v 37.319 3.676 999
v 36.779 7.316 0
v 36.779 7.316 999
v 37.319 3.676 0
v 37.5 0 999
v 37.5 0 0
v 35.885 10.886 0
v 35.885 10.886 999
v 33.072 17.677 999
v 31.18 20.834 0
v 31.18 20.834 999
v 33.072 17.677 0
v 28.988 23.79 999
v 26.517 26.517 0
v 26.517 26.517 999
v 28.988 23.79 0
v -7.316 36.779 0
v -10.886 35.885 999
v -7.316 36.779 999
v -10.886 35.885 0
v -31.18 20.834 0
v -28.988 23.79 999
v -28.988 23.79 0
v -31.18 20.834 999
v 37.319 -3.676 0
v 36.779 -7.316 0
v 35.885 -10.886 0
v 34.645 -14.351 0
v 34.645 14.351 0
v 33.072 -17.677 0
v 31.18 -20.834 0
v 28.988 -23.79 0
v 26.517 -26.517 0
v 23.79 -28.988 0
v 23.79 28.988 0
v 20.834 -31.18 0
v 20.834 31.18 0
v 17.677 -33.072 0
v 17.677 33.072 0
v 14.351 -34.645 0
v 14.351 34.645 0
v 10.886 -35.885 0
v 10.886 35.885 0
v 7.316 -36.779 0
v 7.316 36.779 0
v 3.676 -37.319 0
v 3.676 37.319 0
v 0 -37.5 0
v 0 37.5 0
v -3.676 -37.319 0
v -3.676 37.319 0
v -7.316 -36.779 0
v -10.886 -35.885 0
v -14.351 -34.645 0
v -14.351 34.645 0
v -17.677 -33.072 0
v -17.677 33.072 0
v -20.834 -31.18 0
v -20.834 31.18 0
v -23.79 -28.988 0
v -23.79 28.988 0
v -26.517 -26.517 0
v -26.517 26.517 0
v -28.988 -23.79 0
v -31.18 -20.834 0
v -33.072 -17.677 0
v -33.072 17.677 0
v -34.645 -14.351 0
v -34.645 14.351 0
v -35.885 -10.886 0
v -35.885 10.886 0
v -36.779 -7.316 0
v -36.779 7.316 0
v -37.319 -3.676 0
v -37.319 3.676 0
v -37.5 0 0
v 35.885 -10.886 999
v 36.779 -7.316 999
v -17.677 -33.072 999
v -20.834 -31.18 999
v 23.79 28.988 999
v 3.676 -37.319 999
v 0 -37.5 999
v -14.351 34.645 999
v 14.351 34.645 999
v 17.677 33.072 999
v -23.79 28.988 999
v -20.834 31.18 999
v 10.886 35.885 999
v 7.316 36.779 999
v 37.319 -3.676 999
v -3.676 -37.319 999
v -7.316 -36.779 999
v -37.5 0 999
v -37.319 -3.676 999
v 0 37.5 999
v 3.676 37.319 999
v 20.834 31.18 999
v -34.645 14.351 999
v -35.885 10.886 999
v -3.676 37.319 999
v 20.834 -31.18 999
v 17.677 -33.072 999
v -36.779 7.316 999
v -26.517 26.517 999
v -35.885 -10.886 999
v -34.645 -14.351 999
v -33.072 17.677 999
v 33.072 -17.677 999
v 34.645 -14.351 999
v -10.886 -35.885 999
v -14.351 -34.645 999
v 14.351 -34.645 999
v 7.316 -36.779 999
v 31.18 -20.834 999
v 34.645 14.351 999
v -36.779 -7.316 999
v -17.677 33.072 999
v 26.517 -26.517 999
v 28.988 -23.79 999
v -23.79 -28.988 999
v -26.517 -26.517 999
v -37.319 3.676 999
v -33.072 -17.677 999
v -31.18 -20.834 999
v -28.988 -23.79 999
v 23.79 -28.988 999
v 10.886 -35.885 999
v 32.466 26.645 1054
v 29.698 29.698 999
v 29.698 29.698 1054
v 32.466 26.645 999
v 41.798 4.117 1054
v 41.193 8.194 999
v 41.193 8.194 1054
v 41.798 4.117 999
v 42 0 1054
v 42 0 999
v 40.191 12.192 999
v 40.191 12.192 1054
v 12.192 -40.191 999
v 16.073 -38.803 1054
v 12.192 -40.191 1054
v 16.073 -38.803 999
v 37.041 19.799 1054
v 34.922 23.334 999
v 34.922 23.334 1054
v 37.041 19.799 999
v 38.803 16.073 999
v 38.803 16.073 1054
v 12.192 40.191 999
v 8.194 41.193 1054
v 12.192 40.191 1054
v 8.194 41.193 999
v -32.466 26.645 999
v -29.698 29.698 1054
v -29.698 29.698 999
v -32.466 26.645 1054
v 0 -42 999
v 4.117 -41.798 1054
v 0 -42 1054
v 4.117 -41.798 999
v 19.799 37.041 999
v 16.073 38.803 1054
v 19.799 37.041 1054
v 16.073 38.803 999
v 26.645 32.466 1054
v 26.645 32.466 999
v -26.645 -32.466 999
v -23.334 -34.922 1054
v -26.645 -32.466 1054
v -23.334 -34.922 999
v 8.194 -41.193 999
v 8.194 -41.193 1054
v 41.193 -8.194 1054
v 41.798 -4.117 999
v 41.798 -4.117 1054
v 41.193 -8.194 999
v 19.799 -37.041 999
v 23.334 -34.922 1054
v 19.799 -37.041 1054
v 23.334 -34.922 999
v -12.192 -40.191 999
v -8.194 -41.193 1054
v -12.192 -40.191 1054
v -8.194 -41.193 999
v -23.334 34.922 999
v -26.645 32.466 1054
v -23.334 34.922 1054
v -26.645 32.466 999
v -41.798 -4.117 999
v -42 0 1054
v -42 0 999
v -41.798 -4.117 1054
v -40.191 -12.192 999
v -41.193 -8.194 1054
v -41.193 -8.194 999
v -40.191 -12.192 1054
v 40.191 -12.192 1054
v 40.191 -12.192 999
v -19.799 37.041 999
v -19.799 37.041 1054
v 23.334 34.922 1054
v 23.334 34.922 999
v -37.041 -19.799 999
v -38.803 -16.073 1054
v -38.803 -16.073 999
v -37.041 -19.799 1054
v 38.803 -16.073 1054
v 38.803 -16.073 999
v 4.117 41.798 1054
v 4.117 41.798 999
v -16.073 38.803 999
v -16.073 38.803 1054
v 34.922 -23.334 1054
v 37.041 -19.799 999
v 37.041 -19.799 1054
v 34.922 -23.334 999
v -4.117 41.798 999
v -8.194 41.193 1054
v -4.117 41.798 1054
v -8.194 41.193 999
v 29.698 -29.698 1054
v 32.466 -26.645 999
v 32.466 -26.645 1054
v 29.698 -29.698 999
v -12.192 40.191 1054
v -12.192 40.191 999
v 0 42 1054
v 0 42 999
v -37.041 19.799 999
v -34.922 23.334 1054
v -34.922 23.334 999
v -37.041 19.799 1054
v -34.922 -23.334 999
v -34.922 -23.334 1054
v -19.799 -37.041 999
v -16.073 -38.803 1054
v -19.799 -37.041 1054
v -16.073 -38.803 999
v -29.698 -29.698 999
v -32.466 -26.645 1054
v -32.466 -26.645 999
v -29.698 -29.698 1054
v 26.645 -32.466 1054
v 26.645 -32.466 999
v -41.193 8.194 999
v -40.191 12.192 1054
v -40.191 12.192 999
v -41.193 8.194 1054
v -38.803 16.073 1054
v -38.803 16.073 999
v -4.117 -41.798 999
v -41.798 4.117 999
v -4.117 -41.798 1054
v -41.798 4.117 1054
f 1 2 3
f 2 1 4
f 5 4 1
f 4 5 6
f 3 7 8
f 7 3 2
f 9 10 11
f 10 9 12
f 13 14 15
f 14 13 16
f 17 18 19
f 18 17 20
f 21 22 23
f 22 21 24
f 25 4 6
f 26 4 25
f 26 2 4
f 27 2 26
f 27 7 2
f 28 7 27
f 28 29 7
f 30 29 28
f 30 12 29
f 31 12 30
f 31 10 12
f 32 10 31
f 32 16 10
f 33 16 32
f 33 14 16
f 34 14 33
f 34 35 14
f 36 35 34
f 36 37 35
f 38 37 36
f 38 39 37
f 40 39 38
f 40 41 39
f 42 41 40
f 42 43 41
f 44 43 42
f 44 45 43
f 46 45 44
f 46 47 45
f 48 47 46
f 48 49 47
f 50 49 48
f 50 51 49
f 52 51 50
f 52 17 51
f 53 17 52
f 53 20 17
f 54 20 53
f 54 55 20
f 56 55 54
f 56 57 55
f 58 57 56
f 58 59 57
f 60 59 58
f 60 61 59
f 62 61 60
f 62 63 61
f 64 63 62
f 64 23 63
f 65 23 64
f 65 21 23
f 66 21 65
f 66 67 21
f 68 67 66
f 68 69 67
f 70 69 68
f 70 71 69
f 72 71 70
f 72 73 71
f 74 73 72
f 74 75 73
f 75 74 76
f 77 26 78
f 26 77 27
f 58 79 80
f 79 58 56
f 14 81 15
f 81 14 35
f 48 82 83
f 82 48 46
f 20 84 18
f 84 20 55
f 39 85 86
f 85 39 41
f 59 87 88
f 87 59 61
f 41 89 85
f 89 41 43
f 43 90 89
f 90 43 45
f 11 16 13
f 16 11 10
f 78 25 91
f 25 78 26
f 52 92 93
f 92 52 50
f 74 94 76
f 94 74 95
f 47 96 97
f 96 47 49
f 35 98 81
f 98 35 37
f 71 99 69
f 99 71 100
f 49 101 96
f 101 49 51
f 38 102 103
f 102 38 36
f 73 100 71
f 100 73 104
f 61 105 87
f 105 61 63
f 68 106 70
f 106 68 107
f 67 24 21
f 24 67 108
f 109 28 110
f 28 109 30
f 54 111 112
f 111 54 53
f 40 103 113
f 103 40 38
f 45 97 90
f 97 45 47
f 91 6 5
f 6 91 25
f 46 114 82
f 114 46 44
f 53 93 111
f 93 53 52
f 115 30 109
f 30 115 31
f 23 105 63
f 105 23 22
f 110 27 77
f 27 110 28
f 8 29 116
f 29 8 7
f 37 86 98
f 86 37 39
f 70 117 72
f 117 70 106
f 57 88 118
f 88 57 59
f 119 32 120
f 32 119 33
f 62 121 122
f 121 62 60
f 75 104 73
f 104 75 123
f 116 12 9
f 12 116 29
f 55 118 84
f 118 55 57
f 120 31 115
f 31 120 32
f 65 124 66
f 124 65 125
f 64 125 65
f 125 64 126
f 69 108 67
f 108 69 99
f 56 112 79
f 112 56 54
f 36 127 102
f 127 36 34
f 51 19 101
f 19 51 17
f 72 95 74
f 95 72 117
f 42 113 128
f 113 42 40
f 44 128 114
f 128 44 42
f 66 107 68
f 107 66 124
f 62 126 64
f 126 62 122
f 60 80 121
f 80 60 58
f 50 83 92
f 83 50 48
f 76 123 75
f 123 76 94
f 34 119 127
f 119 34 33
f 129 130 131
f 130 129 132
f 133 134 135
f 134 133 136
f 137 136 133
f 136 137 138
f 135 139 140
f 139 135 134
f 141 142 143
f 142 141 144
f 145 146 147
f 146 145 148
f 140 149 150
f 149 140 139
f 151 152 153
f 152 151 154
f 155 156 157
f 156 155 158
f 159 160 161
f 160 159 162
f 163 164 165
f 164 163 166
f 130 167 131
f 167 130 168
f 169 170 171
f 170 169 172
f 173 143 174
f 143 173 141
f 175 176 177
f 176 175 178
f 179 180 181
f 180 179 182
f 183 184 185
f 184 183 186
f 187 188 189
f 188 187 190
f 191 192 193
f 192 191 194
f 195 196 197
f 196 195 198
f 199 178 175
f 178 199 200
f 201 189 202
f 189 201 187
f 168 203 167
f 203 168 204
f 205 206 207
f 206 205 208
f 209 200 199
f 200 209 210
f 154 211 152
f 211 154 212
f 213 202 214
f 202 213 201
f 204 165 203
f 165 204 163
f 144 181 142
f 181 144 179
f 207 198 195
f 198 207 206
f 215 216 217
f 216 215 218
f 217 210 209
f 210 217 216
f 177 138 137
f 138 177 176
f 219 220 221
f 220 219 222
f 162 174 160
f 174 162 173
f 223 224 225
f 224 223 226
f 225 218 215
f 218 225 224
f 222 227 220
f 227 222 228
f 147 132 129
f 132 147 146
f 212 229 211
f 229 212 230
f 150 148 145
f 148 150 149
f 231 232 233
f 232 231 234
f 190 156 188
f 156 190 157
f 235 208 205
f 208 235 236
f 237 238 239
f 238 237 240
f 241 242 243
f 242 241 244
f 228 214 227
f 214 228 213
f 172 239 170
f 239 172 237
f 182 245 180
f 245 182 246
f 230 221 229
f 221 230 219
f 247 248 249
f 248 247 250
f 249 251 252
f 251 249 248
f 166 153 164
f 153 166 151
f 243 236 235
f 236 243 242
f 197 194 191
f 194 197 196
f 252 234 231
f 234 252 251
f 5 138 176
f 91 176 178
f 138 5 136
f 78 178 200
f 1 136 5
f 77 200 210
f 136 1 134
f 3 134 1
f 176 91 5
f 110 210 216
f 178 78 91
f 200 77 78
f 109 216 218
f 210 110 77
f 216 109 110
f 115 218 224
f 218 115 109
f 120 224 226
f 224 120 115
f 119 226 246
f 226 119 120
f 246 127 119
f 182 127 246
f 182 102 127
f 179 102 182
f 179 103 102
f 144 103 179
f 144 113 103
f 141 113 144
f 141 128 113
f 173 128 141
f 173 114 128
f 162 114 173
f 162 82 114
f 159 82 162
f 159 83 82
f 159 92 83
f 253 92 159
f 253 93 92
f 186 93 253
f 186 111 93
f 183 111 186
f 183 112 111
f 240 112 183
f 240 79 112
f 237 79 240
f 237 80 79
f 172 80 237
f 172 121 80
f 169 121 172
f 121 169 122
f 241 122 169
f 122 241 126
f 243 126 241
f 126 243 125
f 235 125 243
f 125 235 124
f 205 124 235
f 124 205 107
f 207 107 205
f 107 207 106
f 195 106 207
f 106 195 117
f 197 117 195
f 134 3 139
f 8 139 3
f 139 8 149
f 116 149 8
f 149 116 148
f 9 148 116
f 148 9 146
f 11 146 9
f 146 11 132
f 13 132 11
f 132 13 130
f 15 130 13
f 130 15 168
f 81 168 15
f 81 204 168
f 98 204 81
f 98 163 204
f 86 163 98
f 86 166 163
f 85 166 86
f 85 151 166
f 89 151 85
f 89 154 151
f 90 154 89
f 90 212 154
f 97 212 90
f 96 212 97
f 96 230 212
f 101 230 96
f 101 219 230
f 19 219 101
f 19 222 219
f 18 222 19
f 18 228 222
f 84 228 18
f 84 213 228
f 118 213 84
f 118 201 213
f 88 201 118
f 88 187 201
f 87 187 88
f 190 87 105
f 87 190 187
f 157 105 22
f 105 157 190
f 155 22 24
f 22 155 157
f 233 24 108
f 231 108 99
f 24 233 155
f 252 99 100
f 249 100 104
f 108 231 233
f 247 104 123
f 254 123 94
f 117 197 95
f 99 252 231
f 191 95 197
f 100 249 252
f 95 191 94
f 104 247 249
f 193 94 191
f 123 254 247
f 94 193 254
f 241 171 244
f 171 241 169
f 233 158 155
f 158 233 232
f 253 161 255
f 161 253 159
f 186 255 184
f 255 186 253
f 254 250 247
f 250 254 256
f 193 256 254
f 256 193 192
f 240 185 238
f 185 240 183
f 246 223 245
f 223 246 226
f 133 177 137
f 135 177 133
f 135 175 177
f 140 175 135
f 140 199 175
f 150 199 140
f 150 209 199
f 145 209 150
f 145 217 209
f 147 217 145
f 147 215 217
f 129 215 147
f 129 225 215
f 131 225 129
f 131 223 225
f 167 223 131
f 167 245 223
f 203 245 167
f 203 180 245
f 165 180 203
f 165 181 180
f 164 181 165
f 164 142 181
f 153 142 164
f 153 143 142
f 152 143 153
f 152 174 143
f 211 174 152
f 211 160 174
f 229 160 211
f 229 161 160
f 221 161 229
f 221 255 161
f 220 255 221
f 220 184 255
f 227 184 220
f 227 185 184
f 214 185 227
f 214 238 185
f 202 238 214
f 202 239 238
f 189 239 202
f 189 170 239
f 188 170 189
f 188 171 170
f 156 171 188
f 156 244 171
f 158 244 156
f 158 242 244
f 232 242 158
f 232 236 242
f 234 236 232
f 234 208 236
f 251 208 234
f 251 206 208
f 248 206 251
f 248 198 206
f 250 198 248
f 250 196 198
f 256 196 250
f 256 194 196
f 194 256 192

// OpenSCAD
// Parameters
pipe_type = 75; //[50:150:1]
length_mm = 1000; //[500:2000:10]
pipe_od = 75; //[50:150:1]
pipe_wall = 2.7; //[1.5:5.4:0.1]
fitting_length = 55; //[30:110:1]
fitting_od_scale = 1.12; //[1.05:1.3:0.01]
fitting_wall_extra = 1.5; //[0.5:4:0.1]
socket_depth = 40; //[20:80:1]
overlap = 1; //[0.5:2:0.1]

// HT Pipe - complete geometry
module ht_pipe() {
  color([0.85, 0.85, 0.8]) { // PVC color
    // Outer pipe with end fitting
    union() {
      // Main pipe segment
      translate([0, 0, 0])
        cylinder(h=length_mm, r=pipe_od/2, center=false, $fn=64);
      
      // End fitting
      translate([0, 0, length_mm - overlap])
        cylinder(h=fitting_length, r=(pipe_od * fitting_od_scale) / 2, center=false, $fn=64);
    }
    
    // Hollow out the pipe and fitting
    difference() {
      // Outer structure
      union() {
        // Main pipe segment
        translate([0, 0, 0])
          cylinder(h=length_mm, r=pipe_od/2, center=false, $fn=64);
        
        // End fitting
        translate([0, 0, length_mm - overlap])
          cylinder(h=fitting_length, r=(pipe_od * fitting_od_scale) / 2, center=false, $fn=64);
      }
      
      // Main bore
      translate([0, 0, -overlap/2])
        cylinder(h=length_mm + overlap, r=pipe_od/2 - pipe_wall, center=false, $fn=64);
      
      // End fitting bore
      translate([0, 0, length_mm - overlap/2])
        cylinder(h=fitting_length + overlap, r=(pipe_od/2 - pipe_wall) + overlap, center=false, $fn=64);
      
      // Socket void
      translate([0, 0, length_mm - overlap/2])
        cylinder(h=socket_depth + overlap, r=pipe_od/2 + overlap, center=false, $fn=64);
    }
  }
}

// Assembly
module assembly() {
  ht_pipe();
}

assembly();
